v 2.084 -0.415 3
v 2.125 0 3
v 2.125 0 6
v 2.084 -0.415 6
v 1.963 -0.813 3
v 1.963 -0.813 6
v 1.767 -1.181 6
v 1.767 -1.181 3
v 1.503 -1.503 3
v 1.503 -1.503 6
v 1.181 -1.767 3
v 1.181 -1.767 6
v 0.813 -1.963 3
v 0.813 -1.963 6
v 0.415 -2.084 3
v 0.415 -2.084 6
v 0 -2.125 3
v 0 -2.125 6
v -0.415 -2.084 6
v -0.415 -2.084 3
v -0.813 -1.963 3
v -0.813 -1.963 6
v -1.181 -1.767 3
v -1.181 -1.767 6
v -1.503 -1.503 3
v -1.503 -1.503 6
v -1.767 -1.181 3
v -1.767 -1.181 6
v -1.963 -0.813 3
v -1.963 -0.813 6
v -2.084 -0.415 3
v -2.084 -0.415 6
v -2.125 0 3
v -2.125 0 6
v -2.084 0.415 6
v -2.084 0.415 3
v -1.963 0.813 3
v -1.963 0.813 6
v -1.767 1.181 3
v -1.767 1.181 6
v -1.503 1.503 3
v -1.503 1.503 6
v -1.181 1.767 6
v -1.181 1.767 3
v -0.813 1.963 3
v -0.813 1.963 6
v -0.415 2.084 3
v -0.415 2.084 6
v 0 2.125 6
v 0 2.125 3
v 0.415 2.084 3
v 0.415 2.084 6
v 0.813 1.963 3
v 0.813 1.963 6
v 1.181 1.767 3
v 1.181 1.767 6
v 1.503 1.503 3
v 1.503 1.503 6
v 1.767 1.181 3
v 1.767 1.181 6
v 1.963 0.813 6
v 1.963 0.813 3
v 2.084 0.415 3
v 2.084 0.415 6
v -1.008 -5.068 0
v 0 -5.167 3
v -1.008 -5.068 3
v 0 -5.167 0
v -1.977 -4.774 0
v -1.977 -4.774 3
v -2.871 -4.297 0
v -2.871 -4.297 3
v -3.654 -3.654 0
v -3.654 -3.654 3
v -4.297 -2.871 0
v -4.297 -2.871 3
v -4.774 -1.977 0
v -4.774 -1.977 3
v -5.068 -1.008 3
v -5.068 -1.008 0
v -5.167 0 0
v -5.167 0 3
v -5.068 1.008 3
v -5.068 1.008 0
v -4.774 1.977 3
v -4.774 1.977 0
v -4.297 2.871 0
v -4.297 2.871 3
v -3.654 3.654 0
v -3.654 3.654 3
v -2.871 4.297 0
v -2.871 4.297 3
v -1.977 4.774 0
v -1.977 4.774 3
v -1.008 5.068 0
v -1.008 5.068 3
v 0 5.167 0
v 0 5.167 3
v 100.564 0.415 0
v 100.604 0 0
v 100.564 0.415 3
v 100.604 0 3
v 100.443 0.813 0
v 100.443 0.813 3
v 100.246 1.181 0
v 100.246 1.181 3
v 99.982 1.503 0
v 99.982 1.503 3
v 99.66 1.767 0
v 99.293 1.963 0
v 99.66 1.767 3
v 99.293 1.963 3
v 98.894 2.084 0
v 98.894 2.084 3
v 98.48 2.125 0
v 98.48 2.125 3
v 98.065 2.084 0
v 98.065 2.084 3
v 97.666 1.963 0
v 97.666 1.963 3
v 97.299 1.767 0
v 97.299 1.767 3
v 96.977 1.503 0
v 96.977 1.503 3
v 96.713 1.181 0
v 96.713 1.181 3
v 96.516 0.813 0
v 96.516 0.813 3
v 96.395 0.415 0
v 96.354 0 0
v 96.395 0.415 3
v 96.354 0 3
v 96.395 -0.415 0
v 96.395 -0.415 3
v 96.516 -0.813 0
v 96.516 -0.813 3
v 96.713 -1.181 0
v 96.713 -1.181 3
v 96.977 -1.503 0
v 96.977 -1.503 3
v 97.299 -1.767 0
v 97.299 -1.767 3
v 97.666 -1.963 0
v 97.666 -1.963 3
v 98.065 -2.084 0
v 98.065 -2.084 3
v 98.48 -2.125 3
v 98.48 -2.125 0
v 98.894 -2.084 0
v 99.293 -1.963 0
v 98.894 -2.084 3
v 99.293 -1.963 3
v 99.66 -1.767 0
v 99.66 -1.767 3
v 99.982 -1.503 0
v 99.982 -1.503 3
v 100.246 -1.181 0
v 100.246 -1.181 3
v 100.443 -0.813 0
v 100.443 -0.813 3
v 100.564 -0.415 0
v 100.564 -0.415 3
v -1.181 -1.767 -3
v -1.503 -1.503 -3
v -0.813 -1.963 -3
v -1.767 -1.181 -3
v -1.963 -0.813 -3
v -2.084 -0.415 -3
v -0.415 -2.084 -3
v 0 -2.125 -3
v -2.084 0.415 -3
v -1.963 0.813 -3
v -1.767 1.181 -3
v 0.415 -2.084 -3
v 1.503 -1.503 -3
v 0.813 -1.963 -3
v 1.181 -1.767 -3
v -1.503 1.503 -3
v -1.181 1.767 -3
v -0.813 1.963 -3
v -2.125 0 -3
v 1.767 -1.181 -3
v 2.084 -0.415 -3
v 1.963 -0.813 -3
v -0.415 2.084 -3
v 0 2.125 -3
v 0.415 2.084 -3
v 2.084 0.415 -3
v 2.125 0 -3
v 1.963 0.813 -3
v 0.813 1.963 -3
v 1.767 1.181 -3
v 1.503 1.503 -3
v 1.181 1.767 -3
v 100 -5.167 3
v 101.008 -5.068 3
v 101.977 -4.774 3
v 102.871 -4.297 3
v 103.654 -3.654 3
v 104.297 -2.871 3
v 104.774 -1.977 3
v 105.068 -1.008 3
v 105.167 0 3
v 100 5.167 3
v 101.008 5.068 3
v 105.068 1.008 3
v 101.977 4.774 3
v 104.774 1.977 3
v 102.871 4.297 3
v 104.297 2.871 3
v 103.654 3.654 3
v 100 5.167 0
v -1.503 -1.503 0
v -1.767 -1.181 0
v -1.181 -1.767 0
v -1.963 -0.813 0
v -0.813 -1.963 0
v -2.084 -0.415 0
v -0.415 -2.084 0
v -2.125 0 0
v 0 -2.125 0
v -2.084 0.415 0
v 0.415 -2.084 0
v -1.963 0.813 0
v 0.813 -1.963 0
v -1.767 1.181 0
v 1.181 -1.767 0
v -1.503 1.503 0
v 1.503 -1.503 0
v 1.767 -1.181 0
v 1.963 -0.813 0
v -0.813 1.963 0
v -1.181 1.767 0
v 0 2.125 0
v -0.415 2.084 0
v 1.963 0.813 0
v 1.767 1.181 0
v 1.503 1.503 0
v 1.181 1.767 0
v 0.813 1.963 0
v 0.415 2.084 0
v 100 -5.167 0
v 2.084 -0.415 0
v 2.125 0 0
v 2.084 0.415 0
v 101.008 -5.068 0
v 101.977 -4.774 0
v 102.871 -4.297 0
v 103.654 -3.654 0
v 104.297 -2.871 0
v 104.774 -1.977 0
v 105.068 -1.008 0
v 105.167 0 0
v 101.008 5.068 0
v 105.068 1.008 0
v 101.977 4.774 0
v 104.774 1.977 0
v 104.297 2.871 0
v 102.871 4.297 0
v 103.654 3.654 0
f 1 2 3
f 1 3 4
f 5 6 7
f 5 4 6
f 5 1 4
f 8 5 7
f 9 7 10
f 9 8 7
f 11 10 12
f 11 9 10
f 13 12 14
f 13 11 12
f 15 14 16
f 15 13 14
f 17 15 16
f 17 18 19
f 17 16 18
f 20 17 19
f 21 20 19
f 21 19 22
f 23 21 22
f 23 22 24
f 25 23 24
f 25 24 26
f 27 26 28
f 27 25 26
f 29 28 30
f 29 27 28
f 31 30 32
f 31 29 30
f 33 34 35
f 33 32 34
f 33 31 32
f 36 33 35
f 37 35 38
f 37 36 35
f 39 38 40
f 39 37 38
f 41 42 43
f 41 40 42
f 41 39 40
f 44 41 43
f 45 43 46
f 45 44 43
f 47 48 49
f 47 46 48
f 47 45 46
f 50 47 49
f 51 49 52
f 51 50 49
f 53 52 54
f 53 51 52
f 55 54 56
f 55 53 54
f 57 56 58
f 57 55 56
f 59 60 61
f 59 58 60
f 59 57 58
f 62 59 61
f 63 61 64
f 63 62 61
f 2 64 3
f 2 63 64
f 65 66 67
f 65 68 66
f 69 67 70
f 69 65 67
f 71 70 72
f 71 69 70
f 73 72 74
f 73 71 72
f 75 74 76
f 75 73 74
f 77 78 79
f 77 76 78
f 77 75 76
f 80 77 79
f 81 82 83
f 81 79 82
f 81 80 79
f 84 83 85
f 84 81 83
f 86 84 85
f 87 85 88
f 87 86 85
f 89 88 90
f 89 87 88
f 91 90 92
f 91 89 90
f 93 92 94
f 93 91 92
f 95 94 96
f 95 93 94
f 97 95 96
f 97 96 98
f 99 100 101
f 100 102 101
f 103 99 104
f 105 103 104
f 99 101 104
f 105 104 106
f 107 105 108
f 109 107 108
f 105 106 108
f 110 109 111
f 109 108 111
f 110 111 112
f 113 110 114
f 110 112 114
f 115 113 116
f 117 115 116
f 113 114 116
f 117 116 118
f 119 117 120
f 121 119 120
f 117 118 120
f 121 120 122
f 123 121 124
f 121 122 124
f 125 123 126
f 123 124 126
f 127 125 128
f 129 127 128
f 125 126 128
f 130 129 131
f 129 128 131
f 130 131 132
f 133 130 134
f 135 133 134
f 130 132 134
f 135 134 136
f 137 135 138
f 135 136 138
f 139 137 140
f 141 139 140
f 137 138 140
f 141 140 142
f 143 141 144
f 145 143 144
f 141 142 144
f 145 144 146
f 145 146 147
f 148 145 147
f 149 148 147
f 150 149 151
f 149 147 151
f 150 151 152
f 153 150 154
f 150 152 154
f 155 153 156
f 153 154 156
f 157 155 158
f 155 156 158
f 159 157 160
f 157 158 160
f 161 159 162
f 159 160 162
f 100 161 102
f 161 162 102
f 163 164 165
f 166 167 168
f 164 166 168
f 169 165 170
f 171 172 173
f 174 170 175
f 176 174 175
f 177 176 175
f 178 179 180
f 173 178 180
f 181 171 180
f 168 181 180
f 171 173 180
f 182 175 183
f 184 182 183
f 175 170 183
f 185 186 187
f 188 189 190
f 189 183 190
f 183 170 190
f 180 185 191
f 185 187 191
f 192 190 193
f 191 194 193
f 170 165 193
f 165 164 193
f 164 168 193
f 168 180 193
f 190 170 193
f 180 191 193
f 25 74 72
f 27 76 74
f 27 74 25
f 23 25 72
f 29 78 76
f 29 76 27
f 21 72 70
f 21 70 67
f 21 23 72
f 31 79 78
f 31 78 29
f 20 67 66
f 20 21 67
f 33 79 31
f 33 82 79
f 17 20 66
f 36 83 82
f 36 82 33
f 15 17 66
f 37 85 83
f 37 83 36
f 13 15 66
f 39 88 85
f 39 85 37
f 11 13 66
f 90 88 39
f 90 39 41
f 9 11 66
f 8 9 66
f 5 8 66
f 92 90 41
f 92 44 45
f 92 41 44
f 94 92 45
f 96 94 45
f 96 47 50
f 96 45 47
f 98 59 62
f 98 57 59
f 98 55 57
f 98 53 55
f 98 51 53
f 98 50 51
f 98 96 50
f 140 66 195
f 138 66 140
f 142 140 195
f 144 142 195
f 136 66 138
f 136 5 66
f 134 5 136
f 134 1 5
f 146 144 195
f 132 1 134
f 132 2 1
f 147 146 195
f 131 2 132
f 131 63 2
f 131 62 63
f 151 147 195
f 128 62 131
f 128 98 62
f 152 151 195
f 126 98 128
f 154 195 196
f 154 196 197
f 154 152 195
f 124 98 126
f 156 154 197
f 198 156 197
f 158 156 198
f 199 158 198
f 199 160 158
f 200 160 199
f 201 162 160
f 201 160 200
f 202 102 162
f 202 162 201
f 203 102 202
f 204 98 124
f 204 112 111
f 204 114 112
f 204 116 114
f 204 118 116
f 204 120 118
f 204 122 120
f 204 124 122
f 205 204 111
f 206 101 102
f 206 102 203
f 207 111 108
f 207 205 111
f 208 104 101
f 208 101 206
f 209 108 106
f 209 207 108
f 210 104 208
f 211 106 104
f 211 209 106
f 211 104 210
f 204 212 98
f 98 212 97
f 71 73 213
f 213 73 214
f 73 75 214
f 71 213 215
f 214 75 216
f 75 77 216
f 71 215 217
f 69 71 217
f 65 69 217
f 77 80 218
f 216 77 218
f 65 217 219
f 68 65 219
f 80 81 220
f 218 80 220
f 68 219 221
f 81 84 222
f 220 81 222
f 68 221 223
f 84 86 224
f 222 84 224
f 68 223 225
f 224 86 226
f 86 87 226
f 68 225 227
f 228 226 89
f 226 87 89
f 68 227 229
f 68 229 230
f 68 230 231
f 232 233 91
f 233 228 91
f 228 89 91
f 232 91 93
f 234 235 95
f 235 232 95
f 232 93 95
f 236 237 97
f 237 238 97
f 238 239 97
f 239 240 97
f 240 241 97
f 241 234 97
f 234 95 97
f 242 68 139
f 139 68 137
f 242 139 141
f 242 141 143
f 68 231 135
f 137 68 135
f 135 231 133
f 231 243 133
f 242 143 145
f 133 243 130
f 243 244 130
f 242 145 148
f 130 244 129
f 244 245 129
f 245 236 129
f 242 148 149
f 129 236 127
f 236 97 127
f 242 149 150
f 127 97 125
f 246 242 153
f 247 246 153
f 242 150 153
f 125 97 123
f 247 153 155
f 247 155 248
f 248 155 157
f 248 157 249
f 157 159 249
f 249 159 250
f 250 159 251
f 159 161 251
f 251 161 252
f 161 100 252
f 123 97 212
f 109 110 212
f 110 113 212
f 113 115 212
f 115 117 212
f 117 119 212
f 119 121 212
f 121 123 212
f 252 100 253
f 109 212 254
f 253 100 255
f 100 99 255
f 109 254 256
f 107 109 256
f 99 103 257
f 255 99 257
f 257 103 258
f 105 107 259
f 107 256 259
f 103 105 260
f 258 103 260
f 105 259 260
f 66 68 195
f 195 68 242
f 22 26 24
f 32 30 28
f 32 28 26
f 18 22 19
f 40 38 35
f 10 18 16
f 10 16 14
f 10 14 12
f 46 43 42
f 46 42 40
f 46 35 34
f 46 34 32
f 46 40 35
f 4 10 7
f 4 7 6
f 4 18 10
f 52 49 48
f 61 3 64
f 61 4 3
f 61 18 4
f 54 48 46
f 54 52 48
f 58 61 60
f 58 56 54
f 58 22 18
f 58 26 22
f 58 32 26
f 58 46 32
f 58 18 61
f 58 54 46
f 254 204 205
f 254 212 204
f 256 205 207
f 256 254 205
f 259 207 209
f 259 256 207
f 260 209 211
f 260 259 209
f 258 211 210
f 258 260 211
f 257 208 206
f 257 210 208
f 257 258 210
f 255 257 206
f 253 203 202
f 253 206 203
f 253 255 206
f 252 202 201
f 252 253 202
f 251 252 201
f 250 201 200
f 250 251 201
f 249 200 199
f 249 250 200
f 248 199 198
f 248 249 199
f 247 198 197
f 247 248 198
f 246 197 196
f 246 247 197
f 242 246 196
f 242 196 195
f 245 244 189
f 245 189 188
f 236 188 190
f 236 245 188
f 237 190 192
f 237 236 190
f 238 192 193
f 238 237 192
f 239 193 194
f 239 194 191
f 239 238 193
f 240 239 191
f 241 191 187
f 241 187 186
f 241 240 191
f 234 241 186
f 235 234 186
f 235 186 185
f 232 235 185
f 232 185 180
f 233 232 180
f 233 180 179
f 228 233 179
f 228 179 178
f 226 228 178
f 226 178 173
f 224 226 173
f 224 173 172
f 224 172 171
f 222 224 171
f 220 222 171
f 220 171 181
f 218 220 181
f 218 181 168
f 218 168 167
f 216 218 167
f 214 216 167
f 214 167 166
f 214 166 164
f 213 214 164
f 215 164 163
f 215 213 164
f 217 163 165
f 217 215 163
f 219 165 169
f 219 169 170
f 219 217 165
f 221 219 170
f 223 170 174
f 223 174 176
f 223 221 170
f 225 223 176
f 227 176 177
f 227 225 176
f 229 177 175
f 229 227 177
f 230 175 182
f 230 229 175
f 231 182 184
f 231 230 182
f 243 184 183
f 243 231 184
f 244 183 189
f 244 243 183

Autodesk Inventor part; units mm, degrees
ref_plane "YZ Plane" through (0, 0, 0) normal (1, 0, 0) x (0, 1, 0)
ref_plane "XZ Plane" through (0, 0, 0) normal (0, 1, 0) x (-1, 0, 0)
ref_plane "XY Plane" through (0, 0, 0) normal (0, 0, 1) x (1, 0, 0)
sketch "Sketch1" plane through (0, 0, 0) normal (0, 0, 1) x (1, 0, 0)
  line L0 (0, 0) -> (100, 0) construction
  line L1 (0, -5.1674) -> (100, -5.1674)
  line L2 (100, 5.1674) -> (0, 5.1674)
  arc A0 (0, 5.1674) -> (0, -5.1674) centre (0, 0) ccw
  arc A1 (100, -5.1674) -> (100, 5.1674) centre (100, 0) ccw
  point P0 (50, 0)
  dimension "d0" = 100
extrude "Extrusion1" add sketch "Sketch1" along normal blind 3
sketch "Sketch2" plane through (0, 0, 3) normal (0, 0, 1) x (1, 0, 0)
  circle A0 centre (0, 0) radius 2.125
  dimension "d3" = 4.25
extrude "Extrusion2" add sketch "Sketch2" along normal blind 3 and the other way blind 6
sketch "Sketch3" plane through (0, 0, 3) normal (0, 0, 1) x (1, 0, 0)
  circle A0 centre (140.404, 0) radius 2.125
  point P0 (0, 0)
  dimension "d8" = 4.25
extrude "Extrusion3" cut sketch "Sketch3" against normal blind 3
sketch "Sketch4" plane through (0, 0, 3) normal (0, 0, 1) x (1, 0, 0)
  circle A0 centre (120.4729, 0) radius 2.125
  point P0 (0, 0)
  dimension "d11" = 4.25
extrude "Extrusion4" cut sketch "Sketch4" against normal blind 10
sketch "Sketch5" plane through (0, 0, 3) normal (0, 0, 1) x (1, 0, 0)
  circle A0 centre (98.4795, 0) radius 2.125
  point P0 (0, 0)
  dimension "d14" = 4.25
extrude "Extrusion5" cut sketch "Sketch5" against normal blind 10
properties part number "connector linkage"
